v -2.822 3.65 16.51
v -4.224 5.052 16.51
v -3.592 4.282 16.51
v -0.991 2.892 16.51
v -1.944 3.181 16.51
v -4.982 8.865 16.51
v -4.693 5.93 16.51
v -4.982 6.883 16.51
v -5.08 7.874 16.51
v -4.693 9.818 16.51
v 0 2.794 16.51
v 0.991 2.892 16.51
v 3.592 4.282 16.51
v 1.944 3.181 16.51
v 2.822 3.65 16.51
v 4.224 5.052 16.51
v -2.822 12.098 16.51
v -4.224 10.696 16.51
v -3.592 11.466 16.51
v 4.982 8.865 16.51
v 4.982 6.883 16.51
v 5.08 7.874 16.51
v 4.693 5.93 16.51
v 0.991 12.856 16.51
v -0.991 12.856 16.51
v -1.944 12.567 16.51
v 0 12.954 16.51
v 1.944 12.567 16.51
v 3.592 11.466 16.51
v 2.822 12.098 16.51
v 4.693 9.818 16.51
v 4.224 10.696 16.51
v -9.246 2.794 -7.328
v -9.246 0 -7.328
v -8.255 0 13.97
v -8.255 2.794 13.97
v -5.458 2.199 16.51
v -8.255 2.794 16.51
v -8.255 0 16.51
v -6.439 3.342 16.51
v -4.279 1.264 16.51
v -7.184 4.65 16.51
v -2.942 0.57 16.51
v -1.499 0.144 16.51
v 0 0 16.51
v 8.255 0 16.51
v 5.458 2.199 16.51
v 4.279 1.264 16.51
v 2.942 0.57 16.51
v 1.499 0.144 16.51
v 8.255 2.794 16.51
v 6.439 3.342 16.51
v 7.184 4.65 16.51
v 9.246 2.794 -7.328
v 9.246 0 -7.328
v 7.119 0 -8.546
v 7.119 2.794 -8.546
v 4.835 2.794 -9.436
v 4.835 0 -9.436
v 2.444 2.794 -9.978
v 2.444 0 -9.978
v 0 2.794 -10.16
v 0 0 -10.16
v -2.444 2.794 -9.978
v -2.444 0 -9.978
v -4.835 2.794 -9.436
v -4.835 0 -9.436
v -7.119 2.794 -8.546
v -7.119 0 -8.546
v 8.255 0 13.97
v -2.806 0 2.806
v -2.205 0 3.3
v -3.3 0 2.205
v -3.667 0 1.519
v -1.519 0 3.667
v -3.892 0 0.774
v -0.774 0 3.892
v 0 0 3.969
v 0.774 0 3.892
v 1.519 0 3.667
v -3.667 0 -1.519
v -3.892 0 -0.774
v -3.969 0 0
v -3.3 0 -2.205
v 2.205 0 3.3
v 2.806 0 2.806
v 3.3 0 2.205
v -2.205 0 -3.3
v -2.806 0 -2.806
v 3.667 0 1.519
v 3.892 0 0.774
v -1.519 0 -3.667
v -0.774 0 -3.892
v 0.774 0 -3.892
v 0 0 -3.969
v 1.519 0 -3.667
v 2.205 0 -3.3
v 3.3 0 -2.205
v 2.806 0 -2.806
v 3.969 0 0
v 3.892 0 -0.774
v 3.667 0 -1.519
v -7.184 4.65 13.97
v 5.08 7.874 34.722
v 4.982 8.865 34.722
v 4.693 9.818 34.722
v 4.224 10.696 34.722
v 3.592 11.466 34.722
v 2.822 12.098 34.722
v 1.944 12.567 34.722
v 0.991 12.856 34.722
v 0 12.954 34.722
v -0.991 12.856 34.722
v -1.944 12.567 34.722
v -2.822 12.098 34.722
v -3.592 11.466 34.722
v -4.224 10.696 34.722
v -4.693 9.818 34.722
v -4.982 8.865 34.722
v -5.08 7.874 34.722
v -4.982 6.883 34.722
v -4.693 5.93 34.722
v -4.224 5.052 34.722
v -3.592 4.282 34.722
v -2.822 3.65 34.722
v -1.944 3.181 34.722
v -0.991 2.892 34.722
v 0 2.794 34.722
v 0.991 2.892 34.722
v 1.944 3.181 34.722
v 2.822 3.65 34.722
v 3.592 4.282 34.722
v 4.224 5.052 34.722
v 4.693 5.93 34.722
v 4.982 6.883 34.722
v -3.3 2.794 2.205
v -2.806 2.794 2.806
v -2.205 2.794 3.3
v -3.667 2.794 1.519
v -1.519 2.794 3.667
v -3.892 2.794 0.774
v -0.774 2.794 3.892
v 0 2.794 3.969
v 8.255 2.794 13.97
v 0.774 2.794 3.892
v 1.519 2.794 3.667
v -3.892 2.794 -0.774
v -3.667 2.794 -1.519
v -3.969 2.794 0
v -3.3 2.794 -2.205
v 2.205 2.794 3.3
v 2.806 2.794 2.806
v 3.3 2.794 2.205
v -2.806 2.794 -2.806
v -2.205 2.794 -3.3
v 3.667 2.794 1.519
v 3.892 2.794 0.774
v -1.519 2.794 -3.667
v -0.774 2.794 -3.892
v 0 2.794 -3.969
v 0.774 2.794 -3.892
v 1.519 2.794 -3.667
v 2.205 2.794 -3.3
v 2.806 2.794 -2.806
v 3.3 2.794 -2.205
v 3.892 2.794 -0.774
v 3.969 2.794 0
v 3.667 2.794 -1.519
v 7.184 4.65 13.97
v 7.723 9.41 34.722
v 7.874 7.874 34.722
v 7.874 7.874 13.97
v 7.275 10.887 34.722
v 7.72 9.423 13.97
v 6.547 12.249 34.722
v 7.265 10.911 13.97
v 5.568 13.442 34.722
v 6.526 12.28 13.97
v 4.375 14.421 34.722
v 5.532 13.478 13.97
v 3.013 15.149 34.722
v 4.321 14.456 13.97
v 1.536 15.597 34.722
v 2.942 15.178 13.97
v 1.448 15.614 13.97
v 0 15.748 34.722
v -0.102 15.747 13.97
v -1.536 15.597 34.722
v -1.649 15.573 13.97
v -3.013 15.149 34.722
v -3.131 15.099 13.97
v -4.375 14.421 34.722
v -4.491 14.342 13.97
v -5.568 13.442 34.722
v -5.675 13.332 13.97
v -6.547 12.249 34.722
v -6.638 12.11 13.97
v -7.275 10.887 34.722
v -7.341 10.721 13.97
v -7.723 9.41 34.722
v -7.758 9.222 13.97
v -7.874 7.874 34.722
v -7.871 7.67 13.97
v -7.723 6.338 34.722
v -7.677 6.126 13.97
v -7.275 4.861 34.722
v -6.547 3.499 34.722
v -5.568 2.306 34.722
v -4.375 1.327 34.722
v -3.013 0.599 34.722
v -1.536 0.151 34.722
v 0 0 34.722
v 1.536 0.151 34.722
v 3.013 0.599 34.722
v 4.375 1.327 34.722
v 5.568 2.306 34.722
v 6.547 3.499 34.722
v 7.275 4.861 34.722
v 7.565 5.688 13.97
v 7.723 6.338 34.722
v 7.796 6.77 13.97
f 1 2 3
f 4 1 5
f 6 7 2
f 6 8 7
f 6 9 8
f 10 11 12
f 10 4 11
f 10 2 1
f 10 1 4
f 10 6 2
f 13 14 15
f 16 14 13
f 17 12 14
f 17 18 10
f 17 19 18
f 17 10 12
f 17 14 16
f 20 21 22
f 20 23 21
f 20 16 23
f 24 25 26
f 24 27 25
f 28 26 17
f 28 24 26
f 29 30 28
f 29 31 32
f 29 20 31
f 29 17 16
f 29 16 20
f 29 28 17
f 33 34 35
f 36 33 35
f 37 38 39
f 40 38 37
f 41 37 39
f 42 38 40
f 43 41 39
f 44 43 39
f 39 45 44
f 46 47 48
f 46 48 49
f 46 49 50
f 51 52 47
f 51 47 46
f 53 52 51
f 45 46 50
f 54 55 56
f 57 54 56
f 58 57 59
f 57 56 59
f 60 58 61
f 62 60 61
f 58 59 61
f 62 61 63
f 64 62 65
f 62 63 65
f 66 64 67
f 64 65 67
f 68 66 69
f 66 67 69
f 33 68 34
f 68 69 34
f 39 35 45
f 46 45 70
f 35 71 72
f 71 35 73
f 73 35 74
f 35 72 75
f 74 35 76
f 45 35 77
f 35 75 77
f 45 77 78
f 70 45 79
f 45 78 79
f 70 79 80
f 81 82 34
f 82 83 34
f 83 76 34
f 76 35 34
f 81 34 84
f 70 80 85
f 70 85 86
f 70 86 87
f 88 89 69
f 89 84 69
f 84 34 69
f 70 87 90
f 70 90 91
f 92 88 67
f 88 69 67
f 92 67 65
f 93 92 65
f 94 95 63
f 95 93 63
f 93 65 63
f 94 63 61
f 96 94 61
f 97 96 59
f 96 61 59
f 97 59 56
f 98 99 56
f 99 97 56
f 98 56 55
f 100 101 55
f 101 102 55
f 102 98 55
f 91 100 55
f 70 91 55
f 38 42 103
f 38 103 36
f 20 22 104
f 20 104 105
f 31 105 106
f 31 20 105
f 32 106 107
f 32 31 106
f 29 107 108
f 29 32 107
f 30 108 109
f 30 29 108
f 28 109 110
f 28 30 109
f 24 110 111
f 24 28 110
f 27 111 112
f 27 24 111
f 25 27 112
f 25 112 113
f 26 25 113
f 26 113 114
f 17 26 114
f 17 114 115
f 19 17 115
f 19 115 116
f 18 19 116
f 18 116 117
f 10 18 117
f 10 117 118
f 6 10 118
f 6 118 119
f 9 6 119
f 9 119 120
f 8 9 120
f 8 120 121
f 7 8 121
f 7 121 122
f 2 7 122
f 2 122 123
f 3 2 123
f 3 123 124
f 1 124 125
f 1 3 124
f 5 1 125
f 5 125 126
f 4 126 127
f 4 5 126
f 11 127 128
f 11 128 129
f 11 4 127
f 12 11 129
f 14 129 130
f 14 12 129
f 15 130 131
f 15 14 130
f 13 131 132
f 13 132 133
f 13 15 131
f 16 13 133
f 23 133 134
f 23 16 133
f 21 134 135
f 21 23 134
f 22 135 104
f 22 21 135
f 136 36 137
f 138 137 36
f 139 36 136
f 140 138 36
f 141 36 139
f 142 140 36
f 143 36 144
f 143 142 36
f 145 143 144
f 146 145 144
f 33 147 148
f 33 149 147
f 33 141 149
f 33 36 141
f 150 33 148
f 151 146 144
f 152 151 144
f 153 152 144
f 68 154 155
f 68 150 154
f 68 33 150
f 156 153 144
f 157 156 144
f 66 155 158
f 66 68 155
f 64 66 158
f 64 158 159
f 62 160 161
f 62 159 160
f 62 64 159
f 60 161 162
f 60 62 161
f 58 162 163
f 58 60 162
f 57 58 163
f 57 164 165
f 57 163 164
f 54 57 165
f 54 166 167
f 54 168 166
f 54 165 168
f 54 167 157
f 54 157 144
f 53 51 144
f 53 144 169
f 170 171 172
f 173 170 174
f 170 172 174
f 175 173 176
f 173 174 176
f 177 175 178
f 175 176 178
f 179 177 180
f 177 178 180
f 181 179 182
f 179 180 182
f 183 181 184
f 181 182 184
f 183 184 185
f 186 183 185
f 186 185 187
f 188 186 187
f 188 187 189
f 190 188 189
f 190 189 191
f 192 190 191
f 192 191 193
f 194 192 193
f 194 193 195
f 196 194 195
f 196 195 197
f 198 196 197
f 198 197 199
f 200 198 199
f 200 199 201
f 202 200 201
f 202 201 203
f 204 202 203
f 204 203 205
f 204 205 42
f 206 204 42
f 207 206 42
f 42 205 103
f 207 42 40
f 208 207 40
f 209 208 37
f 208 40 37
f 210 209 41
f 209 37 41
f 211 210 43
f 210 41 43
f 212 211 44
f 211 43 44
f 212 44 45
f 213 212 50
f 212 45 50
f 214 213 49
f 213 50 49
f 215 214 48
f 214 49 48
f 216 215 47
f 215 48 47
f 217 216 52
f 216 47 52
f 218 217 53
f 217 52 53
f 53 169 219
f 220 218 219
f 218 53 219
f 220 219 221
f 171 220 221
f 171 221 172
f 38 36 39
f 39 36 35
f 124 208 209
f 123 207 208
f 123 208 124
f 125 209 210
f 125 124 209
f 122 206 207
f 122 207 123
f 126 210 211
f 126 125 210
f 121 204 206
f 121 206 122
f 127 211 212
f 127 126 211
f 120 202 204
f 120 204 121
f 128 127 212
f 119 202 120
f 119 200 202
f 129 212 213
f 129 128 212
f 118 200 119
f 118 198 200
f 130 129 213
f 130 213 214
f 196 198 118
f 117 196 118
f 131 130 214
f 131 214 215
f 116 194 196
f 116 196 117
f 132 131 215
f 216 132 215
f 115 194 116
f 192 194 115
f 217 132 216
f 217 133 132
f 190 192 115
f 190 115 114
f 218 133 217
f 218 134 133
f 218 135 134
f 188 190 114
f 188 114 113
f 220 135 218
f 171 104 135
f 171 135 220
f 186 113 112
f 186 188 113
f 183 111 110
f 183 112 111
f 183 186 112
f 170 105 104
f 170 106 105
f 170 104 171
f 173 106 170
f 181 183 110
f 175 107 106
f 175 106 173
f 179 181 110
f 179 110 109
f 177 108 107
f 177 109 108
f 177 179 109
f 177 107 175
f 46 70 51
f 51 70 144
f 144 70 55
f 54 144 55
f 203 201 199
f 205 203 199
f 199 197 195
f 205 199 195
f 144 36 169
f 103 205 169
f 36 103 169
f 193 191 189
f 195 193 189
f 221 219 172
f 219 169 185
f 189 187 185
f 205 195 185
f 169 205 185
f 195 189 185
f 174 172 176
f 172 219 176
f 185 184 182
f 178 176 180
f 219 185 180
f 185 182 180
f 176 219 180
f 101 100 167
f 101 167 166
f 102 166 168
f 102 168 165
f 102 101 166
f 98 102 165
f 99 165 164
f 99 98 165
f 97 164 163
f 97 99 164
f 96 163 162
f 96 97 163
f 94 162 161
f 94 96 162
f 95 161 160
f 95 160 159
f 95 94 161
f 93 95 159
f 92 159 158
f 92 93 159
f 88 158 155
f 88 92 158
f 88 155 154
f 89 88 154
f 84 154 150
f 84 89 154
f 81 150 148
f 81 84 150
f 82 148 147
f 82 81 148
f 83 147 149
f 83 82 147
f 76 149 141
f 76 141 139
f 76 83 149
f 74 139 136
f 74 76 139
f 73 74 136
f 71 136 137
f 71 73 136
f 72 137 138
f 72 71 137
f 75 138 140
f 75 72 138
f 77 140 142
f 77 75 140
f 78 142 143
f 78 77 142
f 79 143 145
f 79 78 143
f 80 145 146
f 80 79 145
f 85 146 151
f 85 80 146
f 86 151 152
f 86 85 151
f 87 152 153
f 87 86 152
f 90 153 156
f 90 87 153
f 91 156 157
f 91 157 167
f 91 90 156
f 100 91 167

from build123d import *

# Parameters (mm, degrees)
SKETCH1_R                   = 3.96875
LUG_DEPTH                   = 2.794
SKETCH2_R                   = 7.874
SKETCH2_R_2                 = 5.08
CRIMP_SOCKET_DEPTH          = 20.7518
LUG_SOCKET_CONNECTION_DEPTH = 2.54


with BuildPart() as part:
    # Sketch1 → Lug (new body)
    with BuildSketch(Plane(origin=(0, 0, 0), x_dir=(1, 0, 0), z_dir=(0, 1, 0))):
        with BuildLine():
            Line((-9.2456, 7.328412943), (-8.255, -13.97))
            Line((-8.255, -13.97), (8.255, -13.97))
            Line((8.255, -13.97), (9.2456, 7.328412943))
            ThreePointArc((9.2456, 7.328412943), (0, 10.16), (-9.2456, 7.328412943))
        make_face()
        Circle(SKETCH1_R, mode=Mode.SUBTRACT)
    extrude(amount=LUG_DEPTH)

    # Sketch2 → Crimp Socket (add)
    with BuildSketch(Plane.XY.offset(13.97)):
        with Locations((0, 7.874)):
            Circle(SKETCH2_R)
        with Locations((0, 7.874)):
            Circle(SKETCH2_R_2, mode=Mode.SUBTRACT)
    extrude(amount=CRIMP_SOCKET_DEPTH)

    # Sketch3 → Lug Socket Connection (add)
    with BuildSketch(Plane.XY.offset(13.97)):
        with BuildLine():
            Line((8.255, 2.794), (7.183591408, 4.649734117))
            ThreePointArc((7.183591408, 4.649734117), (0, 15.748), (-7.183591408, 4.649734117))
            Line((-7.183591408, 4.649734117), (-8.255, 2.794))
            Line((-8.255, 2.794), (-8.255, 0))
            Line((-8.255, 0), (8.255, 0))
            Line((8.255, 0), (8.255, 2.794))
        make_face()
    extrude(amount=LUG_SOCKET_CONNECTION_DEPTH)


solid = part.part
